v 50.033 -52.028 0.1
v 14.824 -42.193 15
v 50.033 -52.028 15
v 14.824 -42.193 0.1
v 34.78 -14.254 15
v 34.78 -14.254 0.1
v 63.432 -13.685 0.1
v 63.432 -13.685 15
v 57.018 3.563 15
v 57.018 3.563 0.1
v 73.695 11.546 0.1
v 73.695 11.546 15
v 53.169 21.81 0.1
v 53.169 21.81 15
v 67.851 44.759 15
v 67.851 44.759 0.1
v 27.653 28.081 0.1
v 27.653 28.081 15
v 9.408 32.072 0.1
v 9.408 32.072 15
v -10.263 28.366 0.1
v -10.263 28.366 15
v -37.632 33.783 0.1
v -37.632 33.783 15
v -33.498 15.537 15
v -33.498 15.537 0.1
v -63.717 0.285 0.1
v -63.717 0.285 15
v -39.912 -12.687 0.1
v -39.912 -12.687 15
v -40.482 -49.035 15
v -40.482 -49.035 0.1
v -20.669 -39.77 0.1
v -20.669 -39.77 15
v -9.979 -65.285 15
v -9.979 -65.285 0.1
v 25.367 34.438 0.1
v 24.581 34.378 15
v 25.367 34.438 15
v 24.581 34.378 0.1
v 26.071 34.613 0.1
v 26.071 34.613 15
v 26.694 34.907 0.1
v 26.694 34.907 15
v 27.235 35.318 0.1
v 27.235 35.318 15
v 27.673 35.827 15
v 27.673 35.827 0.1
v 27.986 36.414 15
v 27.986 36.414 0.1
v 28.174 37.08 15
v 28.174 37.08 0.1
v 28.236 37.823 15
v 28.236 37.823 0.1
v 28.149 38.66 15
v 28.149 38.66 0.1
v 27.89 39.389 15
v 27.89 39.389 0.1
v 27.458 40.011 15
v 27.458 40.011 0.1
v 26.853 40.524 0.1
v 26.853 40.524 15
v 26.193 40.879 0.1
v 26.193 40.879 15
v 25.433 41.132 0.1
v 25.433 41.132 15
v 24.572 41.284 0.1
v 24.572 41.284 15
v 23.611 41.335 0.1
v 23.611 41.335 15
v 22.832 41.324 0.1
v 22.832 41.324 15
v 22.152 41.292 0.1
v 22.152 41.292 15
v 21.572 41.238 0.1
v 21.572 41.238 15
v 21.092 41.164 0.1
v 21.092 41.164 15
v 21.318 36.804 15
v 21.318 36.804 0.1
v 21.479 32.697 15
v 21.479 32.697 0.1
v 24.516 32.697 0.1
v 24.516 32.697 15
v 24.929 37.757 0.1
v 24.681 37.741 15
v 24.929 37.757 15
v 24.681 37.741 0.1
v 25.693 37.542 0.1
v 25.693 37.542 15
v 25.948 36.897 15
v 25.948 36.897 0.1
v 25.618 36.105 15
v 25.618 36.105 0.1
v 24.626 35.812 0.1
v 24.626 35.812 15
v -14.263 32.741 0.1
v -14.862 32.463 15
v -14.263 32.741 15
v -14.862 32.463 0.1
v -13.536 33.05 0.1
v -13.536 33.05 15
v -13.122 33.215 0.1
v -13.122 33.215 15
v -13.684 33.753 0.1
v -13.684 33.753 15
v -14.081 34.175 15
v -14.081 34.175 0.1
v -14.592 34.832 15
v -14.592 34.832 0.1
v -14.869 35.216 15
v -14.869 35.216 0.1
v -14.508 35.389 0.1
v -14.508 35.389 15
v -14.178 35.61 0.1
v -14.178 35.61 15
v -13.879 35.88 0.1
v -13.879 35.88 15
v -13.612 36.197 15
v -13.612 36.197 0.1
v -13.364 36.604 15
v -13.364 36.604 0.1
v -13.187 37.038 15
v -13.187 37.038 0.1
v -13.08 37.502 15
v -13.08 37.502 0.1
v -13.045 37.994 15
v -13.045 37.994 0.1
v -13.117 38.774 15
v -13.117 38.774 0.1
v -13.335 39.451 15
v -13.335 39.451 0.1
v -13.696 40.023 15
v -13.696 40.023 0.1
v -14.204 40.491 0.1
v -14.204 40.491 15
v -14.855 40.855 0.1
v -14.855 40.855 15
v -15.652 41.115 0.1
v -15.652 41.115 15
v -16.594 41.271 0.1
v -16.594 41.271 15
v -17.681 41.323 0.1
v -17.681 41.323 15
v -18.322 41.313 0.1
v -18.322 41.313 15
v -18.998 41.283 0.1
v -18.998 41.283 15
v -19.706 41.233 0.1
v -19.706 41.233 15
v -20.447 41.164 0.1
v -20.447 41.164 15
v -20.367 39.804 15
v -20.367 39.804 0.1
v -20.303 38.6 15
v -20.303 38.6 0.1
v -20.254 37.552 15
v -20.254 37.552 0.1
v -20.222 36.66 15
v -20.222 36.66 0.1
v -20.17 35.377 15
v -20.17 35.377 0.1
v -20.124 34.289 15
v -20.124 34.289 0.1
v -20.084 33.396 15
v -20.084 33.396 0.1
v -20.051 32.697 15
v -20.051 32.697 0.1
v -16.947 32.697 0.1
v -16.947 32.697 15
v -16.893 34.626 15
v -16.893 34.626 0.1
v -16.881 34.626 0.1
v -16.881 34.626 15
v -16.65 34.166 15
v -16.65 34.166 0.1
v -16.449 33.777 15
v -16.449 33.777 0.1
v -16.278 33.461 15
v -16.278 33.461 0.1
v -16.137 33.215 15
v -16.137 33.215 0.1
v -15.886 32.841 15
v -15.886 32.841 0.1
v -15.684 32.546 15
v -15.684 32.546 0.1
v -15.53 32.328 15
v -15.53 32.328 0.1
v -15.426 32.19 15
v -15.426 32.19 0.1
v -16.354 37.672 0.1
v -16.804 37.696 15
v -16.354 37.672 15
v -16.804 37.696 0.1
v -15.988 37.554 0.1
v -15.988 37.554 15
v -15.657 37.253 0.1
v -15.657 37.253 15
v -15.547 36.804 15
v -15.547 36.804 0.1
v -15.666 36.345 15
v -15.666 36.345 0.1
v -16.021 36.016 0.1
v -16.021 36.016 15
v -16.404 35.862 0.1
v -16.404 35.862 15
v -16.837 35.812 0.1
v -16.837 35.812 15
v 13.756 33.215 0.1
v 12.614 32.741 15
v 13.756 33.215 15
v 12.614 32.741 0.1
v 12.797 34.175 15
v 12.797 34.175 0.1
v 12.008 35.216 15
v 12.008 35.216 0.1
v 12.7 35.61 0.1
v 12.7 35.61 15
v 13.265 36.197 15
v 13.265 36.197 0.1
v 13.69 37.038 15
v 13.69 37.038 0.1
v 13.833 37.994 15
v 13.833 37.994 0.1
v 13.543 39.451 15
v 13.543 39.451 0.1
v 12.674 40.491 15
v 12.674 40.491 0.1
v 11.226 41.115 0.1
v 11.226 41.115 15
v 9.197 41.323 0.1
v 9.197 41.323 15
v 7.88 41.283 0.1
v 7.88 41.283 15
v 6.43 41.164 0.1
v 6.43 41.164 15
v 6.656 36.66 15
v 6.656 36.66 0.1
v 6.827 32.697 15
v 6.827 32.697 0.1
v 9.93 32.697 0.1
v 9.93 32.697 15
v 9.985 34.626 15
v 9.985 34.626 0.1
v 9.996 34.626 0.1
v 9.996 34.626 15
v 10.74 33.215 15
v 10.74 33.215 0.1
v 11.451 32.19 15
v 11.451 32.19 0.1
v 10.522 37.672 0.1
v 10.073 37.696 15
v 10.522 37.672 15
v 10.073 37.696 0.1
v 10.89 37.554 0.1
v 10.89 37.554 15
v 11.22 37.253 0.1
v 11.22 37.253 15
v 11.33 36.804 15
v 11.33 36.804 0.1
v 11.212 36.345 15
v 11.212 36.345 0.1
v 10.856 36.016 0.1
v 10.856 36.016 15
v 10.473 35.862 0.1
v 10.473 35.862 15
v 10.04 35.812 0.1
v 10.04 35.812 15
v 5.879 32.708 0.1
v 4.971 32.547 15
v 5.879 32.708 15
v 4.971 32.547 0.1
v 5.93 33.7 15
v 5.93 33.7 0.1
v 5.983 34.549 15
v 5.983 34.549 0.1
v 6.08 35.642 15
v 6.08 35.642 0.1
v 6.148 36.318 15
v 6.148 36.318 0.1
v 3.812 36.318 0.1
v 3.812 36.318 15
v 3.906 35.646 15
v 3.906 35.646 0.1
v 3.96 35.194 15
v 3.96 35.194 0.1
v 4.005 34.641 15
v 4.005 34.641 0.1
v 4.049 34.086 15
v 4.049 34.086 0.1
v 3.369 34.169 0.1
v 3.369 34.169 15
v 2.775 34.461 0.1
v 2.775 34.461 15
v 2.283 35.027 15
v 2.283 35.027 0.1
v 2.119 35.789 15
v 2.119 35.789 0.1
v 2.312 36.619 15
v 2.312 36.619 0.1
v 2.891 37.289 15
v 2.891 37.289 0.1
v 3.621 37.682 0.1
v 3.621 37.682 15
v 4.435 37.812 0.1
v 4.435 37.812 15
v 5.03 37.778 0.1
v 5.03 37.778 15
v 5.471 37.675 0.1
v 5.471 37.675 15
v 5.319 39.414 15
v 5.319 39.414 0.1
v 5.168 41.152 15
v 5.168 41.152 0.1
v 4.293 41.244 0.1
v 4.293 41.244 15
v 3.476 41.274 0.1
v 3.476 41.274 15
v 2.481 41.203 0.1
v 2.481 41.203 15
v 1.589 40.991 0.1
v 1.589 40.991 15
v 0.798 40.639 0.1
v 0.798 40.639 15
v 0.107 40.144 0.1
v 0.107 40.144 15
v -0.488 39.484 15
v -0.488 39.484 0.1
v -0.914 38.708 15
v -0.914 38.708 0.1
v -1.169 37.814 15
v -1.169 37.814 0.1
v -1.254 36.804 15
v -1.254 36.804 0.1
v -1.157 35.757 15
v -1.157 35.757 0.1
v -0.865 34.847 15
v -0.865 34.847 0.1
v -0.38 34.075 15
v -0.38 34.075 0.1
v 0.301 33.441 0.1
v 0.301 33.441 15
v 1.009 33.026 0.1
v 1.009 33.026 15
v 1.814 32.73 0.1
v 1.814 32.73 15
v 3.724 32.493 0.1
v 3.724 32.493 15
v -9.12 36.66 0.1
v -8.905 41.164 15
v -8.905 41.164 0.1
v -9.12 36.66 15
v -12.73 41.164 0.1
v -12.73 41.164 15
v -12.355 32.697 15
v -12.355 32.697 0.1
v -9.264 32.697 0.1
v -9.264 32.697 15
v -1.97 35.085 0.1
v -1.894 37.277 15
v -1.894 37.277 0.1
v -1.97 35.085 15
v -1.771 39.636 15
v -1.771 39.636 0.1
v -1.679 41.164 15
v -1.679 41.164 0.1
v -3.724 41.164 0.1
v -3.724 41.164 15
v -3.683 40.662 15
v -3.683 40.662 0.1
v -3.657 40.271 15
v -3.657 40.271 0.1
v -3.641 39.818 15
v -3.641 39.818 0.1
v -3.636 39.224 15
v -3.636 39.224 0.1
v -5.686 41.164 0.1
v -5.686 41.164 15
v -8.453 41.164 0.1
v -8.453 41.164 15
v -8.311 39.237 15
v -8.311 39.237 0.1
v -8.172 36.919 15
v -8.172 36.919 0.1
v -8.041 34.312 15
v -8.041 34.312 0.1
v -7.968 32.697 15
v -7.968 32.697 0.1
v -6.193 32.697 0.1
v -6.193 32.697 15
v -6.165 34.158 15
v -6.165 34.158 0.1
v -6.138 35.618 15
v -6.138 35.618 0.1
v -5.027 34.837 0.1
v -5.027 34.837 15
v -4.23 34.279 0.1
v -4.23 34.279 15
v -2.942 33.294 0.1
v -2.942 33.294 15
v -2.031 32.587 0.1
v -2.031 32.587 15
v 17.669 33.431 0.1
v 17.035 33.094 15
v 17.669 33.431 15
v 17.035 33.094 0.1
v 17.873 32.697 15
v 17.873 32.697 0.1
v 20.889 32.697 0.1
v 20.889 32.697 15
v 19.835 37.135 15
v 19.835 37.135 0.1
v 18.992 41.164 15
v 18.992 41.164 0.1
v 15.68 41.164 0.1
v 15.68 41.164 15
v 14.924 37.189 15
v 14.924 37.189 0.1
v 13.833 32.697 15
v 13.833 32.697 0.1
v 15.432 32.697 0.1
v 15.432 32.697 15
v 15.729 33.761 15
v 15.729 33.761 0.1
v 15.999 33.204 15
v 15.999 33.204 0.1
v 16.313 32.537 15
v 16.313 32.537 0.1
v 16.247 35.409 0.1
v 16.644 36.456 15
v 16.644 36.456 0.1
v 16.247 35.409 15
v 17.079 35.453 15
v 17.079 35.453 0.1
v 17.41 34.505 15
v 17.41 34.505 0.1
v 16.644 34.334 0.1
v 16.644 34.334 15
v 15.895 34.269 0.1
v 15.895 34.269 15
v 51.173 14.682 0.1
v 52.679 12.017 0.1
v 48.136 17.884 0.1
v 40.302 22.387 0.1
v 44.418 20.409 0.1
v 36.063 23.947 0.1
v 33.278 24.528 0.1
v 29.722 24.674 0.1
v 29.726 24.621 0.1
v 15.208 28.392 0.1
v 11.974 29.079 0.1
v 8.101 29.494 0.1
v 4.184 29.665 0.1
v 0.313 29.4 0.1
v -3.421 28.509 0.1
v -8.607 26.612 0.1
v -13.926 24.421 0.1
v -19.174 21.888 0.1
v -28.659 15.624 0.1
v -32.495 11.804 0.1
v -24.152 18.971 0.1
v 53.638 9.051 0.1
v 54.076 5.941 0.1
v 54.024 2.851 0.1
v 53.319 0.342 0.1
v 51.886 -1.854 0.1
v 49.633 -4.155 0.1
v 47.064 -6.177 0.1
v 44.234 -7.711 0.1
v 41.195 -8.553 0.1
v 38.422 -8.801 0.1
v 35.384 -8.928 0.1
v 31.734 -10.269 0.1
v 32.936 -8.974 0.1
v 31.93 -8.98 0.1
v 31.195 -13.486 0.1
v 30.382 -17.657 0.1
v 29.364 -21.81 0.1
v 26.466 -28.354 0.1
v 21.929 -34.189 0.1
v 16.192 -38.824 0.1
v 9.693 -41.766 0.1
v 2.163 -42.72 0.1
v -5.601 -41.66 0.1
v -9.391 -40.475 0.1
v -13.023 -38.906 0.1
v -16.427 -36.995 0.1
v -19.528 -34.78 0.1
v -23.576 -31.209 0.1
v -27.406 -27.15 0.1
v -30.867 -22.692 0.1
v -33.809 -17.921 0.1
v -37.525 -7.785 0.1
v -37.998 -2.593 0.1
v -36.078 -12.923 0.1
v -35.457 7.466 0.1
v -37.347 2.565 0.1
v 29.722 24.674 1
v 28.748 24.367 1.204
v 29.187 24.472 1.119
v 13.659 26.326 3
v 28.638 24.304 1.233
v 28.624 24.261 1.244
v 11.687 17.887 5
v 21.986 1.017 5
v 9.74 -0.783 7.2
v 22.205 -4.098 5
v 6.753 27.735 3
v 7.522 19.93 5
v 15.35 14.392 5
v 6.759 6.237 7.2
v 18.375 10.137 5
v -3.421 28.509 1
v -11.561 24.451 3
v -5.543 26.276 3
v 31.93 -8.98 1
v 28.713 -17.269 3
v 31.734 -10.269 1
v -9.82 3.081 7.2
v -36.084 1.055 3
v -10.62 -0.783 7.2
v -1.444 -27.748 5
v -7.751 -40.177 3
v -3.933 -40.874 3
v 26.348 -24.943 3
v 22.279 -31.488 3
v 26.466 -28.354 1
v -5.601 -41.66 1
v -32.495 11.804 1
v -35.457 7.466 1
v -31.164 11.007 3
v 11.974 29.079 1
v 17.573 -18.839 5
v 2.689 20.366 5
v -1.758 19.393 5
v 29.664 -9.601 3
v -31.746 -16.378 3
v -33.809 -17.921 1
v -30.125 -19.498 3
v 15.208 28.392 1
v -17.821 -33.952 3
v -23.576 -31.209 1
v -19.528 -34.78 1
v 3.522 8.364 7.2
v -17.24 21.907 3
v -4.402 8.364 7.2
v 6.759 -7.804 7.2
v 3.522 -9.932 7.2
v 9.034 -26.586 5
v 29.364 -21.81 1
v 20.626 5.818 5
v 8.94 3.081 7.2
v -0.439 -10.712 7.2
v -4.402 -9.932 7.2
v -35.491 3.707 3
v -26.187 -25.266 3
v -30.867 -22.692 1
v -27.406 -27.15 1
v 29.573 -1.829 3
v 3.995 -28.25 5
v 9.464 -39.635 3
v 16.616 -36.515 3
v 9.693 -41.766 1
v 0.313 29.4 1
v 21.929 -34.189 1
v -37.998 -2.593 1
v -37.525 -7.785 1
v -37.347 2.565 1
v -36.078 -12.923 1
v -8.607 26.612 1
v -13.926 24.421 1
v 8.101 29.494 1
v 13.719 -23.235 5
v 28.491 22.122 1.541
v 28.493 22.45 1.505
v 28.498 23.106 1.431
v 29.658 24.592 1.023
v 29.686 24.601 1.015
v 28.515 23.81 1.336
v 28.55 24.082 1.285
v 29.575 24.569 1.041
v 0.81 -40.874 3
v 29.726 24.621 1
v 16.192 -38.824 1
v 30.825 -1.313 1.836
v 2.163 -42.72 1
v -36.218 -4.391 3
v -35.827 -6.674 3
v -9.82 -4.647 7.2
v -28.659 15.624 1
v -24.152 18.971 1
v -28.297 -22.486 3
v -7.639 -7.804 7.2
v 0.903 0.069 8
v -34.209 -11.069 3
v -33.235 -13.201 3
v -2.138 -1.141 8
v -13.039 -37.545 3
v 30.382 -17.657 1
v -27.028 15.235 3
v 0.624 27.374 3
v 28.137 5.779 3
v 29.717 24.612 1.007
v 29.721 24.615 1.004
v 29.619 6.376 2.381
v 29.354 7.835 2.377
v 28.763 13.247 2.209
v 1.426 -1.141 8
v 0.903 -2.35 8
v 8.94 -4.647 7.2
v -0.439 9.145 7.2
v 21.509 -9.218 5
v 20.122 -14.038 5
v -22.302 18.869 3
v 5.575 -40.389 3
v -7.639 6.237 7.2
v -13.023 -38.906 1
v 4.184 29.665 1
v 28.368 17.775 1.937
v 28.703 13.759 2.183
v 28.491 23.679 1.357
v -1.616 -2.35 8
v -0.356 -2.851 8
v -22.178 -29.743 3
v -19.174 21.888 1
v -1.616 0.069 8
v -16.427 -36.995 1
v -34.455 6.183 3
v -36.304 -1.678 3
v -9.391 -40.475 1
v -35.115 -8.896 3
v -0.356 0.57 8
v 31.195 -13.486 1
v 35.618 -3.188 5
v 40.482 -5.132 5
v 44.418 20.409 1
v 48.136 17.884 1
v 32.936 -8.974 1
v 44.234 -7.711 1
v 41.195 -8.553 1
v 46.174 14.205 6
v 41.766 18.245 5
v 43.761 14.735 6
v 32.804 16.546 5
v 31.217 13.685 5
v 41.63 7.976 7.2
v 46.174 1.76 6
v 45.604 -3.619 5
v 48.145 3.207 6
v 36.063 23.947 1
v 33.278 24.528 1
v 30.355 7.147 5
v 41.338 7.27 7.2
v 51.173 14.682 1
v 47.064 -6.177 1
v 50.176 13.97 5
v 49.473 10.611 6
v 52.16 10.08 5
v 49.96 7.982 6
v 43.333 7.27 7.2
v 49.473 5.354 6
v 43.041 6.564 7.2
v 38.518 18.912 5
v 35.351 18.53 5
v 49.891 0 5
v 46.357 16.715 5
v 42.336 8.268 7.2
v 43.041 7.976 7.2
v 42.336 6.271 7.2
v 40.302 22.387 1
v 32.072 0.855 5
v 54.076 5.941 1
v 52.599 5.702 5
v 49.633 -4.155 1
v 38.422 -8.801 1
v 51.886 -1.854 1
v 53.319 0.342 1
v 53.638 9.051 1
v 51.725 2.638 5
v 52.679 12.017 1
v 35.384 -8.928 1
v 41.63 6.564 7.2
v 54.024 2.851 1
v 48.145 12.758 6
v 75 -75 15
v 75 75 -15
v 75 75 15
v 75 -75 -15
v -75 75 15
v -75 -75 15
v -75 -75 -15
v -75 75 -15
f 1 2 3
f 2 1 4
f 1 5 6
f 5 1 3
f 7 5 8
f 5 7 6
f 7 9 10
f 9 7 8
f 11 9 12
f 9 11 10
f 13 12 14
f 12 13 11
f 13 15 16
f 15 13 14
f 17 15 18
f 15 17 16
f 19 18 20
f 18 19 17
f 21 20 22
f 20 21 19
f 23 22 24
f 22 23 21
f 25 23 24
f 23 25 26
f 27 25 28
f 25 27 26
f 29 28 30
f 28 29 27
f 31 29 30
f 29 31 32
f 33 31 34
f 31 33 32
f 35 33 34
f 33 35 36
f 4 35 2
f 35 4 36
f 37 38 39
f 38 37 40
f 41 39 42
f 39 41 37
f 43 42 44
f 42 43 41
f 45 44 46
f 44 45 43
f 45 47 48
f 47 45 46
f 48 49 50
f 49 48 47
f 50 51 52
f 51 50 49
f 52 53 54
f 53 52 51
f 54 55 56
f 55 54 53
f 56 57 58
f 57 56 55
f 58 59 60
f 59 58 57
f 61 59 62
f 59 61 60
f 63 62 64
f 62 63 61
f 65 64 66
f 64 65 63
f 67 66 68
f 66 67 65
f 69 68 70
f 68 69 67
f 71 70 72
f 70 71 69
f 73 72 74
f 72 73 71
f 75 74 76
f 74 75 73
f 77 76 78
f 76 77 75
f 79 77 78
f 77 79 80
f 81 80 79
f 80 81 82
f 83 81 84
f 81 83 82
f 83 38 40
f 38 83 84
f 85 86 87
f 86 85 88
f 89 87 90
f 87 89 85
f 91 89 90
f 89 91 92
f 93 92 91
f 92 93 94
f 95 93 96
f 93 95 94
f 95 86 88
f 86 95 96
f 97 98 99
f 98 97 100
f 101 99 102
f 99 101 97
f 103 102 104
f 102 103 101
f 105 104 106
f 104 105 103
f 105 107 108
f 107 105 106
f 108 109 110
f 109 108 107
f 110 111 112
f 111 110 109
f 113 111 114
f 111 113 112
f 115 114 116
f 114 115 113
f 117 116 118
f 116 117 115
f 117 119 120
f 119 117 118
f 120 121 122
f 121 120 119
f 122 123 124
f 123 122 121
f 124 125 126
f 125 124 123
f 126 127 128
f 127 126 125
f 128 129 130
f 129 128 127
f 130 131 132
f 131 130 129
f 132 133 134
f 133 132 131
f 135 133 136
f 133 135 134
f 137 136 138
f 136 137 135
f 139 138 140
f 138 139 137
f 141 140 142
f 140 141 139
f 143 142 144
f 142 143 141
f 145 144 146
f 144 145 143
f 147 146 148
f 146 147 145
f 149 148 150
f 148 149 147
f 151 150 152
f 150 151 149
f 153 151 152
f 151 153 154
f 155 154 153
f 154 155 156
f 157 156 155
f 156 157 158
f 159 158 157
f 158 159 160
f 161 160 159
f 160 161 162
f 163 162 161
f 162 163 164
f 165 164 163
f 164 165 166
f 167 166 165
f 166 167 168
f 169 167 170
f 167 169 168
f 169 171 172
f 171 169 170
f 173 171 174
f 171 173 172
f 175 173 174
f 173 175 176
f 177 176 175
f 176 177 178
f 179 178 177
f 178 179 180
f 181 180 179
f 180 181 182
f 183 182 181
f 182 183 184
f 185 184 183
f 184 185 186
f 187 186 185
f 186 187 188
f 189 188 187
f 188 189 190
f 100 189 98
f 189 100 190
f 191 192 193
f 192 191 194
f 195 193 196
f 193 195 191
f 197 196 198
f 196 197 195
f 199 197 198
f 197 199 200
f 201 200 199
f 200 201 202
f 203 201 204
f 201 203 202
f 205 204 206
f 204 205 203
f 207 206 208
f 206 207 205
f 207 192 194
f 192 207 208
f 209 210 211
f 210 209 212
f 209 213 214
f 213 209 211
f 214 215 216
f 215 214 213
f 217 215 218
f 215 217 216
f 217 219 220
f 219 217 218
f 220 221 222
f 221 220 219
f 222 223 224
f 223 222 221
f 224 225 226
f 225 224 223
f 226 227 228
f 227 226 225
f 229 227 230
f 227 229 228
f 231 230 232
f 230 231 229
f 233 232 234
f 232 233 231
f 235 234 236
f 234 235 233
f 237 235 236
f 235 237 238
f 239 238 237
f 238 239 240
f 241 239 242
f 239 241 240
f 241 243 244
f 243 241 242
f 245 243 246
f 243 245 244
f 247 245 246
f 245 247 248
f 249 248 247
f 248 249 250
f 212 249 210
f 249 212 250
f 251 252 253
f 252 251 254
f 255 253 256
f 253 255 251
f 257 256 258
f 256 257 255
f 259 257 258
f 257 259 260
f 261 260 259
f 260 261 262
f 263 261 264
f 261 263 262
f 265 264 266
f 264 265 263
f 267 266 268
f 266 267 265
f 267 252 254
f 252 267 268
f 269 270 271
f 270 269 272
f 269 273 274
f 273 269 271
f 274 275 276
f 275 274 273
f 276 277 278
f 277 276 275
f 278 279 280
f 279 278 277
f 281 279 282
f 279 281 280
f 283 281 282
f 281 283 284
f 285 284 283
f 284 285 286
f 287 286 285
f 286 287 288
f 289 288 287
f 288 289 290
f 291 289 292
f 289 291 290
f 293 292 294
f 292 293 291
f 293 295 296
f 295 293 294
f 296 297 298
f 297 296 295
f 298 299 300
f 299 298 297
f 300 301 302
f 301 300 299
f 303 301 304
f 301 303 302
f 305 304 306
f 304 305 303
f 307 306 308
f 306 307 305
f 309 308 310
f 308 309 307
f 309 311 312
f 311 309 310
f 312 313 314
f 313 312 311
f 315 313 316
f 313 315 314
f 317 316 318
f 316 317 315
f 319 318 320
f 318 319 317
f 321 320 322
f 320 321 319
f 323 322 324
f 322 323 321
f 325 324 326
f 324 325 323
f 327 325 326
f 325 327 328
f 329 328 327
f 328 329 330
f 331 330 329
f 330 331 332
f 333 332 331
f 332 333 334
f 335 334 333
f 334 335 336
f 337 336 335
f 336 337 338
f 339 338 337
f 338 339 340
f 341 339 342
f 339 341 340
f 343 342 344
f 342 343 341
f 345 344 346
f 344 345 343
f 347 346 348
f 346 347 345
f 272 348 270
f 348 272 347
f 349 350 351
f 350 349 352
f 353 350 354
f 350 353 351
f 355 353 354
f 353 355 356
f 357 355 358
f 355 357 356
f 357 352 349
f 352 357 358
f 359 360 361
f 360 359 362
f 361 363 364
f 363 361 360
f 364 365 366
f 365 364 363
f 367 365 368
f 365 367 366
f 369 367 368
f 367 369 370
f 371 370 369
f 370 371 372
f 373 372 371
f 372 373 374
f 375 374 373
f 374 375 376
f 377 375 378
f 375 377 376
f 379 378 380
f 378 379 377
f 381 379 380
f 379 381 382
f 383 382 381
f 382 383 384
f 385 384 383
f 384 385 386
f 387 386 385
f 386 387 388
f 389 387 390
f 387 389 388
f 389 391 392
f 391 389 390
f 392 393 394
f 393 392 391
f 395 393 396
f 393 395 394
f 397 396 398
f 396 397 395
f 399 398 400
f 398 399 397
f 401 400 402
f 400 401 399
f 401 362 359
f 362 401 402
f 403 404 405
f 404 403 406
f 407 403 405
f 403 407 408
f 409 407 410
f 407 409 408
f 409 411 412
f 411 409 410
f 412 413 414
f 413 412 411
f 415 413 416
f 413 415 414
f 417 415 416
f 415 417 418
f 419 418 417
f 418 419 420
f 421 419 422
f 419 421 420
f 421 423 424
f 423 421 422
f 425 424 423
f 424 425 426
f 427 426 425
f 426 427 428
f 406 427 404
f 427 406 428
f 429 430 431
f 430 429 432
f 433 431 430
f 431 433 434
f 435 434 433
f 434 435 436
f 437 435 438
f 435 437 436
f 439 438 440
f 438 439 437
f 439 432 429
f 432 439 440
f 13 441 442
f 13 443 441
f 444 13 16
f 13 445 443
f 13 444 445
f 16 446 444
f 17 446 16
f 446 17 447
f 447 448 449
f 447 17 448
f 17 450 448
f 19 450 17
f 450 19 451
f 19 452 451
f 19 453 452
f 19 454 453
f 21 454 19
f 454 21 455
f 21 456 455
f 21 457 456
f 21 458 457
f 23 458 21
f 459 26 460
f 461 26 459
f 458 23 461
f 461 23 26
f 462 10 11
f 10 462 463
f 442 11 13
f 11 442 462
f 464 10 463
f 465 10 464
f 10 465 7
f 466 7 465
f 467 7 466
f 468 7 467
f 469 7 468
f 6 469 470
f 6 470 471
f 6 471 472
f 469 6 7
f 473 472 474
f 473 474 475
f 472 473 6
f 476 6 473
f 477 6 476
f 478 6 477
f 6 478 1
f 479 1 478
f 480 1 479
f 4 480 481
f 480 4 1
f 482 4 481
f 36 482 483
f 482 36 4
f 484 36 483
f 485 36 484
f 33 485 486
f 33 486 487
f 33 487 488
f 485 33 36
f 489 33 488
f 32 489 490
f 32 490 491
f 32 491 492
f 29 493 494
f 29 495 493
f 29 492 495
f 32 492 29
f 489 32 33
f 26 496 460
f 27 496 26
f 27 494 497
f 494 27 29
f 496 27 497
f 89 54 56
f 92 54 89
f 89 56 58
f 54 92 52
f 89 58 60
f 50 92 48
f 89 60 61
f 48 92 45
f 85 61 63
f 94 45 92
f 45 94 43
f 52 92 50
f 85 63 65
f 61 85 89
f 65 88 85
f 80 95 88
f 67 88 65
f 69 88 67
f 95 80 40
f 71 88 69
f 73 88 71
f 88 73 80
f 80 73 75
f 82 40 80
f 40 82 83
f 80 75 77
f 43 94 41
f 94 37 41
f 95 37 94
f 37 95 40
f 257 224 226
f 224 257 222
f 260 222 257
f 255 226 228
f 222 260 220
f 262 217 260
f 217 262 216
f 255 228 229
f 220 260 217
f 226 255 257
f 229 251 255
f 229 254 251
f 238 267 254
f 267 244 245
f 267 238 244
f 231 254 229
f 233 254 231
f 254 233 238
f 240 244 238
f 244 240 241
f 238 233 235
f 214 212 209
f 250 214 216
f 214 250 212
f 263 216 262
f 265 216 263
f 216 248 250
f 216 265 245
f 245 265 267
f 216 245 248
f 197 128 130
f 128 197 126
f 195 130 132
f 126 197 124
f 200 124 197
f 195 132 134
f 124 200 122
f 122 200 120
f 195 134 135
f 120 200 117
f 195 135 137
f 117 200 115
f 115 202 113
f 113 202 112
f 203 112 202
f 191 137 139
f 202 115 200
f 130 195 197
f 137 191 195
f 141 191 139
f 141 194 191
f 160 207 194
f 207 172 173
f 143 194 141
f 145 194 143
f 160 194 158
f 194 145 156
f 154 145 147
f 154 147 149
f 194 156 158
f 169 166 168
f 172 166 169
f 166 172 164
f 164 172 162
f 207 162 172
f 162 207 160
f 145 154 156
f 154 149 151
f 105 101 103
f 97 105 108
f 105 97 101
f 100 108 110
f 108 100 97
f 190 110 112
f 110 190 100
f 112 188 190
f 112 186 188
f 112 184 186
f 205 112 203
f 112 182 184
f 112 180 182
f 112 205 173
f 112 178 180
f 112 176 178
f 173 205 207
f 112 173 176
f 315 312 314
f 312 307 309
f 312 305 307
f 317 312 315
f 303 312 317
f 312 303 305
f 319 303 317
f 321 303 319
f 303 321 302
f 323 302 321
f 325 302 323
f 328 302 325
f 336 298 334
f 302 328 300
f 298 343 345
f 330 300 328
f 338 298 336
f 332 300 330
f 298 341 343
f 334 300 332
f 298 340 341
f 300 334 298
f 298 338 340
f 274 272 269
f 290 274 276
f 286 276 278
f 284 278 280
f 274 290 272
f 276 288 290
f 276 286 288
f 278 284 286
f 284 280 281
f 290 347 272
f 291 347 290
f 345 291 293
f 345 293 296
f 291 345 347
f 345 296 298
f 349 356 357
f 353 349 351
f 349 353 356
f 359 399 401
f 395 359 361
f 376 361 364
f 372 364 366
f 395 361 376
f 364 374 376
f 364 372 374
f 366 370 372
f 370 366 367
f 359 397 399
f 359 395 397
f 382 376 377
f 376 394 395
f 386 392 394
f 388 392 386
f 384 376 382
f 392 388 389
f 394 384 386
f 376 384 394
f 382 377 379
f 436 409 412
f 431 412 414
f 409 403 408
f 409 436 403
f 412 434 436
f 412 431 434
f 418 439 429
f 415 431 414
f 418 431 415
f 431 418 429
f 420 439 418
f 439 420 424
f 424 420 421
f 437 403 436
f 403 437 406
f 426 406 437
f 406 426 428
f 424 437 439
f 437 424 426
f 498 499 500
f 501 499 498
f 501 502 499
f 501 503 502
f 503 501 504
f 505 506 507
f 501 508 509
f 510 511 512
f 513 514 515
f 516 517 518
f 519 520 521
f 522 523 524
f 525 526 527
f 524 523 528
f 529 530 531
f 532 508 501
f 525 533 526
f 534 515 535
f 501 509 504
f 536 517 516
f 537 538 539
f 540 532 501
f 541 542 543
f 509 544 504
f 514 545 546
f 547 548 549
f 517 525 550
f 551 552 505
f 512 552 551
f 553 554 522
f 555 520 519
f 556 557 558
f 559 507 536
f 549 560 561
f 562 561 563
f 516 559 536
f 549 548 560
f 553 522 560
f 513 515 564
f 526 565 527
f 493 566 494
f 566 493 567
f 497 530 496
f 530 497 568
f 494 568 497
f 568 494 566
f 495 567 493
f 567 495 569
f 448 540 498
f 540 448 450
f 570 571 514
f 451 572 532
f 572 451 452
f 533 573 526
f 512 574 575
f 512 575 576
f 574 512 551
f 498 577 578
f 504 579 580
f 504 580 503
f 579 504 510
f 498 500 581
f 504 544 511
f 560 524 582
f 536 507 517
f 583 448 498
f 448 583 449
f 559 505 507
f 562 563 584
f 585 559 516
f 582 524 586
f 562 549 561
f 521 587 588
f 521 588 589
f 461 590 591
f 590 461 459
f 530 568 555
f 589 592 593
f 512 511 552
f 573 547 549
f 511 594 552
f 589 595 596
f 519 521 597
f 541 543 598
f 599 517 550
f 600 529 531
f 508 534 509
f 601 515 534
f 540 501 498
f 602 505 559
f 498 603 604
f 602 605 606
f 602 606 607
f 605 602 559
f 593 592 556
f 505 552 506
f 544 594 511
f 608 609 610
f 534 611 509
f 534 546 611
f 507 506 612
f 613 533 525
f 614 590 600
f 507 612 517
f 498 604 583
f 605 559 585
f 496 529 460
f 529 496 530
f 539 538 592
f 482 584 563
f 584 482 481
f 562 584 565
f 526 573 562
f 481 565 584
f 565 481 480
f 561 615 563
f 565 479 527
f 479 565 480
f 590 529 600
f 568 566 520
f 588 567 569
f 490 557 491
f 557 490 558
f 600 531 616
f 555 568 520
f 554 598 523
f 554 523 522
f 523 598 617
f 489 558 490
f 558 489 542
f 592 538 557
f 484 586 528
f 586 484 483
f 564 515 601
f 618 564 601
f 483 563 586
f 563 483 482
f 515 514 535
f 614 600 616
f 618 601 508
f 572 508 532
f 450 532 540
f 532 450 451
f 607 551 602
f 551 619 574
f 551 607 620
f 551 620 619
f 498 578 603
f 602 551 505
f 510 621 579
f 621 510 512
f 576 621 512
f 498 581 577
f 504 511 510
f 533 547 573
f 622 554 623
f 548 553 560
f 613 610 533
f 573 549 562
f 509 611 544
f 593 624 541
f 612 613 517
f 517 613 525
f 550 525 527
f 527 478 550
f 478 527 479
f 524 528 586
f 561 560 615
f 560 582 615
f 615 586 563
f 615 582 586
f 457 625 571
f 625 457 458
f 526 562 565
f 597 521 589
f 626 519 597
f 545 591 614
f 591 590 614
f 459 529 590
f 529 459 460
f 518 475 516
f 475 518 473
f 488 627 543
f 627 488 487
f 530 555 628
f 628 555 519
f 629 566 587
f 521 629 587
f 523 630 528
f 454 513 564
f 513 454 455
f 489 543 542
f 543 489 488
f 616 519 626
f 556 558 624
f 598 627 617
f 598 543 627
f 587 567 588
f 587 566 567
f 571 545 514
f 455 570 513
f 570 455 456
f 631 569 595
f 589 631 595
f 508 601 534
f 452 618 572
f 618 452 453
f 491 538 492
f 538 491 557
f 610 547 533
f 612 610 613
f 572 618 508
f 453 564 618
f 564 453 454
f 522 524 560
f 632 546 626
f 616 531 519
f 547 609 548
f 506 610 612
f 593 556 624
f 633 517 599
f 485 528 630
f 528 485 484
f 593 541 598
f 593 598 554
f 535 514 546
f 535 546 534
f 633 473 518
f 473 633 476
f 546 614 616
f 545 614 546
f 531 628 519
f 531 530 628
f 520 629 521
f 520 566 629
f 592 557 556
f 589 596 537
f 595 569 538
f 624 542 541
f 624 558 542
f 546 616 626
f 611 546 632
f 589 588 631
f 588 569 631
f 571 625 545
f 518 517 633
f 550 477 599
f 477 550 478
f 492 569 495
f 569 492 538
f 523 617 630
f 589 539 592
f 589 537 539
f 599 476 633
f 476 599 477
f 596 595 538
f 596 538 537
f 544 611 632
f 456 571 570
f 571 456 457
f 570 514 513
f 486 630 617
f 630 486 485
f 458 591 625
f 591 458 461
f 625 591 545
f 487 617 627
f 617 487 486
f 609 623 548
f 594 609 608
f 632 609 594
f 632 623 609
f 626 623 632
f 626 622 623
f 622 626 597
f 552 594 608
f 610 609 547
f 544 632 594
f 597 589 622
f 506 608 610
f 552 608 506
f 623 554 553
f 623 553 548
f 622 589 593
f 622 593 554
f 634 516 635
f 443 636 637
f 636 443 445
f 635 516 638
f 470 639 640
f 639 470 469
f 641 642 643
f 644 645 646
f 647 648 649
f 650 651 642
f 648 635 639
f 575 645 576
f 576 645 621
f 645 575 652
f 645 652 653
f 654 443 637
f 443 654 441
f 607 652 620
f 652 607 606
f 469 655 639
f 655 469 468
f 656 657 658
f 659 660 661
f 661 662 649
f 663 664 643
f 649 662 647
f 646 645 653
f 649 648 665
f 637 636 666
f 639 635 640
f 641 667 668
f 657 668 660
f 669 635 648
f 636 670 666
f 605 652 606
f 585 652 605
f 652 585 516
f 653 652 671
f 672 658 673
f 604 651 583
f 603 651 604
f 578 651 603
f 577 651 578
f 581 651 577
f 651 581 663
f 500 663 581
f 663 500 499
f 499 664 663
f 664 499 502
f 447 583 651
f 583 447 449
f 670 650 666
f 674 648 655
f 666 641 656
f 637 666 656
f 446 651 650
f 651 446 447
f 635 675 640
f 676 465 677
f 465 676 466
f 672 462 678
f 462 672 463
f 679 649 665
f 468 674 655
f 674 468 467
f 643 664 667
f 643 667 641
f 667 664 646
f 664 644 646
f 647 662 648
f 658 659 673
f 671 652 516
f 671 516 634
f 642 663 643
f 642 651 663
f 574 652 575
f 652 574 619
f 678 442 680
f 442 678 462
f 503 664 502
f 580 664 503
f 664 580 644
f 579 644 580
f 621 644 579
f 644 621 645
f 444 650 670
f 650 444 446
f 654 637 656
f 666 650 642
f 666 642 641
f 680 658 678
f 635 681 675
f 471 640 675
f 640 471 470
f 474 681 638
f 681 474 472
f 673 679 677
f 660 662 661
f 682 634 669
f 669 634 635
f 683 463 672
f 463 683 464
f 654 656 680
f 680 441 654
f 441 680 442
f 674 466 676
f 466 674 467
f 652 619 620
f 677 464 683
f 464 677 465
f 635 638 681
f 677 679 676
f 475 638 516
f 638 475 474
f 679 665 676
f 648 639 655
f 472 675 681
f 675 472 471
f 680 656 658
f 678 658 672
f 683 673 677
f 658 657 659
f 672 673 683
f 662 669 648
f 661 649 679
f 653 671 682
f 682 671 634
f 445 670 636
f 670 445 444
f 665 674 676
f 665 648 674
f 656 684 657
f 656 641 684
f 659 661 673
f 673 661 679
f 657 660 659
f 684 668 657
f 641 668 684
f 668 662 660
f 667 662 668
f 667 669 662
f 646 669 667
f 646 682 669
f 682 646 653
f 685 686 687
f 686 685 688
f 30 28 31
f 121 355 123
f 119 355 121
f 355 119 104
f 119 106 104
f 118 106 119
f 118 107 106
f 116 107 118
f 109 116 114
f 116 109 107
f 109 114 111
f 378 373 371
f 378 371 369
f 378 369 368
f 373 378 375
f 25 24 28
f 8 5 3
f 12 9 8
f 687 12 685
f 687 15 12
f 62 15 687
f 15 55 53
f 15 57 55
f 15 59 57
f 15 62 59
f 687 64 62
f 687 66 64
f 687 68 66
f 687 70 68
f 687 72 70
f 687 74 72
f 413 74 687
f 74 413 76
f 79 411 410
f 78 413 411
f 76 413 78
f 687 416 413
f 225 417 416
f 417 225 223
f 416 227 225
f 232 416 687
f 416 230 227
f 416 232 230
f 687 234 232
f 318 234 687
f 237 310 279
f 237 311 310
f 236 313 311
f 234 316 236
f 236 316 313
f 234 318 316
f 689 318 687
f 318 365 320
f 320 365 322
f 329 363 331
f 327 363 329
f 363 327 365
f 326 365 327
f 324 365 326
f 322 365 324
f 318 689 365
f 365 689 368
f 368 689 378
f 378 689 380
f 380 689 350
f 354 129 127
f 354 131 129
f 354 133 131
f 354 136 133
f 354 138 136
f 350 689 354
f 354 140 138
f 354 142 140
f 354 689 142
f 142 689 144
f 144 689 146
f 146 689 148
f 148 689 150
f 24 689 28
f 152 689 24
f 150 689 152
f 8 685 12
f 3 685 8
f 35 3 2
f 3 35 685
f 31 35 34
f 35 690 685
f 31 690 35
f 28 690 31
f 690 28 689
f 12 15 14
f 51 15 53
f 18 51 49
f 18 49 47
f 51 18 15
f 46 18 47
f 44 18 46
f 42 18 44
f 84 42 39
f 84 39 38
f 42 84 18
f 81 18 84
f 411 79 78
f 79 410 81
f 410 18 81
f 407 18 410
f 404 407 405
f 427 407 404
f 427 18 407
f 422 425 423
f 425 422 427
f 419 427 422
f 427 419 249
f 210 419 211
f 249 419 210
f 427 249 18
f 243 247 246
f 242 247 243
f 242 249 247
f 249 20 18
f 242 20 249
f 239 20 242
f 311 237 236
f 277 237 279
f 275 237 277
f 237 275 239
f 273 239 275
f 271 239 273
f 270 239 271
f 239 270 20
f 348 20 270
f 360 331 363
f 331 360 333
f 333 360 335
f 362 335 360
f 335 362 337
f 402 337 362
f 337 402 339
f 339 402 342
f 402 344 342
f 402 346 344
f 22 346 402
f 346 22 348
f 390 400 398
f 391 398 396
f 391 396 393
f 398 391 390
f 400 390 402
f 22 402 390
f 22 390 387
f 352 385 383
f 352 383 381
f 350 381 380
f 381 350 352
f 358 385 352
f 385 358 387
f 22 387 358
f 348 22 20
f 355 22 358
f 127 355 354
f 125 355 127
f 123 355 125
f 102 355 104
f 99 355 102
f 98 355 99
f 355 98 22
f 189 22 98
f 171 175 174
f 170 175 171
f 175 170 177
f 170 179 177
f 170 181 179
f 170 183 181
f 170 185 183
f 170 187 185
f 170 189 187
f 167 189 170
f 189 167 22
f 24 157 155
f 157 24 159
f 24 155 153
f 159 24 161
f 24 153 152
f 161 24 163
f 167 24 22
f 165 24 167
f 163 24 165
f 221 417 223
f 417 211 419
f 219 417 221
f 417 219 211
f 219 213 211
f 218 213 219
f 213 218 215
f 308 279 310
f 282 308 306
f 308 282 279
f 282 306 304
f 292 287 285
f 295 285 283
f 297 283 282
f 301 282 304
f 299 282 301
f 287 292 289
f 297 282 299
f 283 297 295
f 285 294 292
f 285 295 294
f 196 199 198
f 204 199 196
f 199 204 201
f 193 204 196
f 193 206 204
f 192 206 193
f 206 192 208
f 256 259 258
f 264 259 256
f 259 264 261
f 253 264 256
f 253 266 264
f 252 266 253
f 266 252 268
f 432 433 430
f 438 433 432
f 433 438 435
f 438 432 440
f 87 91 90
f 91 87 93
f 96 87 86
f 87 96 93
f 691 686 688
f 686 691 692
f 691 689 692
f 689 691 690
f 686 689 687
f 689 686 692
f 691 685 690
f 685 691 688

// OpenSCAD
difference(){
	cube([150,150,30],center=true);
	stamp();	
}
module stamp(){
	render(){
		difference(){
			union(){
				linear_extrude(999)import(file = "Logo.dxf",layer="Cut_out");	
				linear_extrude(999)import(file = "Logo.dxf",layer="Text"); 
			}
			logo();
		}
	}
}

module logo(){
	render(){
		linear_extrude(.1)import(file = "Logo.dxf",layer="Cut_out"); 
		linear_extrude(.1)import(file = "Logo.dxf",layer="Text"); 

		hull(){
			linear_extrude(1)import(file = "Logo.dxf",layer="GBase");
			linear_extrude(3)import(file = "Logo.dxf",layer="GHull3"); 
			linear_extrude(5)import(file = "Logo.dxf",layer="Hull2"); 
			linear_extrude(7.2)import(file = "Logo.dxf",layer="GHull1"); 
			linear_extrude(8)import(file = "Logo.dxf",layer="GHull0"); 
		}

		hull(){
			linear_extrude(1)import(file = "Logo.dxf",layer="TBase");
			linear_extrude(5)import(file = "Logo.dxf",layer="THull3"); 
			linear_extrude(6)import(file = "Logo.dxf",layer="THull1"); 
			linear_extrude(7.2)import(file = "Logo.dxf",layer="THull0"); 
		}
	}
}
